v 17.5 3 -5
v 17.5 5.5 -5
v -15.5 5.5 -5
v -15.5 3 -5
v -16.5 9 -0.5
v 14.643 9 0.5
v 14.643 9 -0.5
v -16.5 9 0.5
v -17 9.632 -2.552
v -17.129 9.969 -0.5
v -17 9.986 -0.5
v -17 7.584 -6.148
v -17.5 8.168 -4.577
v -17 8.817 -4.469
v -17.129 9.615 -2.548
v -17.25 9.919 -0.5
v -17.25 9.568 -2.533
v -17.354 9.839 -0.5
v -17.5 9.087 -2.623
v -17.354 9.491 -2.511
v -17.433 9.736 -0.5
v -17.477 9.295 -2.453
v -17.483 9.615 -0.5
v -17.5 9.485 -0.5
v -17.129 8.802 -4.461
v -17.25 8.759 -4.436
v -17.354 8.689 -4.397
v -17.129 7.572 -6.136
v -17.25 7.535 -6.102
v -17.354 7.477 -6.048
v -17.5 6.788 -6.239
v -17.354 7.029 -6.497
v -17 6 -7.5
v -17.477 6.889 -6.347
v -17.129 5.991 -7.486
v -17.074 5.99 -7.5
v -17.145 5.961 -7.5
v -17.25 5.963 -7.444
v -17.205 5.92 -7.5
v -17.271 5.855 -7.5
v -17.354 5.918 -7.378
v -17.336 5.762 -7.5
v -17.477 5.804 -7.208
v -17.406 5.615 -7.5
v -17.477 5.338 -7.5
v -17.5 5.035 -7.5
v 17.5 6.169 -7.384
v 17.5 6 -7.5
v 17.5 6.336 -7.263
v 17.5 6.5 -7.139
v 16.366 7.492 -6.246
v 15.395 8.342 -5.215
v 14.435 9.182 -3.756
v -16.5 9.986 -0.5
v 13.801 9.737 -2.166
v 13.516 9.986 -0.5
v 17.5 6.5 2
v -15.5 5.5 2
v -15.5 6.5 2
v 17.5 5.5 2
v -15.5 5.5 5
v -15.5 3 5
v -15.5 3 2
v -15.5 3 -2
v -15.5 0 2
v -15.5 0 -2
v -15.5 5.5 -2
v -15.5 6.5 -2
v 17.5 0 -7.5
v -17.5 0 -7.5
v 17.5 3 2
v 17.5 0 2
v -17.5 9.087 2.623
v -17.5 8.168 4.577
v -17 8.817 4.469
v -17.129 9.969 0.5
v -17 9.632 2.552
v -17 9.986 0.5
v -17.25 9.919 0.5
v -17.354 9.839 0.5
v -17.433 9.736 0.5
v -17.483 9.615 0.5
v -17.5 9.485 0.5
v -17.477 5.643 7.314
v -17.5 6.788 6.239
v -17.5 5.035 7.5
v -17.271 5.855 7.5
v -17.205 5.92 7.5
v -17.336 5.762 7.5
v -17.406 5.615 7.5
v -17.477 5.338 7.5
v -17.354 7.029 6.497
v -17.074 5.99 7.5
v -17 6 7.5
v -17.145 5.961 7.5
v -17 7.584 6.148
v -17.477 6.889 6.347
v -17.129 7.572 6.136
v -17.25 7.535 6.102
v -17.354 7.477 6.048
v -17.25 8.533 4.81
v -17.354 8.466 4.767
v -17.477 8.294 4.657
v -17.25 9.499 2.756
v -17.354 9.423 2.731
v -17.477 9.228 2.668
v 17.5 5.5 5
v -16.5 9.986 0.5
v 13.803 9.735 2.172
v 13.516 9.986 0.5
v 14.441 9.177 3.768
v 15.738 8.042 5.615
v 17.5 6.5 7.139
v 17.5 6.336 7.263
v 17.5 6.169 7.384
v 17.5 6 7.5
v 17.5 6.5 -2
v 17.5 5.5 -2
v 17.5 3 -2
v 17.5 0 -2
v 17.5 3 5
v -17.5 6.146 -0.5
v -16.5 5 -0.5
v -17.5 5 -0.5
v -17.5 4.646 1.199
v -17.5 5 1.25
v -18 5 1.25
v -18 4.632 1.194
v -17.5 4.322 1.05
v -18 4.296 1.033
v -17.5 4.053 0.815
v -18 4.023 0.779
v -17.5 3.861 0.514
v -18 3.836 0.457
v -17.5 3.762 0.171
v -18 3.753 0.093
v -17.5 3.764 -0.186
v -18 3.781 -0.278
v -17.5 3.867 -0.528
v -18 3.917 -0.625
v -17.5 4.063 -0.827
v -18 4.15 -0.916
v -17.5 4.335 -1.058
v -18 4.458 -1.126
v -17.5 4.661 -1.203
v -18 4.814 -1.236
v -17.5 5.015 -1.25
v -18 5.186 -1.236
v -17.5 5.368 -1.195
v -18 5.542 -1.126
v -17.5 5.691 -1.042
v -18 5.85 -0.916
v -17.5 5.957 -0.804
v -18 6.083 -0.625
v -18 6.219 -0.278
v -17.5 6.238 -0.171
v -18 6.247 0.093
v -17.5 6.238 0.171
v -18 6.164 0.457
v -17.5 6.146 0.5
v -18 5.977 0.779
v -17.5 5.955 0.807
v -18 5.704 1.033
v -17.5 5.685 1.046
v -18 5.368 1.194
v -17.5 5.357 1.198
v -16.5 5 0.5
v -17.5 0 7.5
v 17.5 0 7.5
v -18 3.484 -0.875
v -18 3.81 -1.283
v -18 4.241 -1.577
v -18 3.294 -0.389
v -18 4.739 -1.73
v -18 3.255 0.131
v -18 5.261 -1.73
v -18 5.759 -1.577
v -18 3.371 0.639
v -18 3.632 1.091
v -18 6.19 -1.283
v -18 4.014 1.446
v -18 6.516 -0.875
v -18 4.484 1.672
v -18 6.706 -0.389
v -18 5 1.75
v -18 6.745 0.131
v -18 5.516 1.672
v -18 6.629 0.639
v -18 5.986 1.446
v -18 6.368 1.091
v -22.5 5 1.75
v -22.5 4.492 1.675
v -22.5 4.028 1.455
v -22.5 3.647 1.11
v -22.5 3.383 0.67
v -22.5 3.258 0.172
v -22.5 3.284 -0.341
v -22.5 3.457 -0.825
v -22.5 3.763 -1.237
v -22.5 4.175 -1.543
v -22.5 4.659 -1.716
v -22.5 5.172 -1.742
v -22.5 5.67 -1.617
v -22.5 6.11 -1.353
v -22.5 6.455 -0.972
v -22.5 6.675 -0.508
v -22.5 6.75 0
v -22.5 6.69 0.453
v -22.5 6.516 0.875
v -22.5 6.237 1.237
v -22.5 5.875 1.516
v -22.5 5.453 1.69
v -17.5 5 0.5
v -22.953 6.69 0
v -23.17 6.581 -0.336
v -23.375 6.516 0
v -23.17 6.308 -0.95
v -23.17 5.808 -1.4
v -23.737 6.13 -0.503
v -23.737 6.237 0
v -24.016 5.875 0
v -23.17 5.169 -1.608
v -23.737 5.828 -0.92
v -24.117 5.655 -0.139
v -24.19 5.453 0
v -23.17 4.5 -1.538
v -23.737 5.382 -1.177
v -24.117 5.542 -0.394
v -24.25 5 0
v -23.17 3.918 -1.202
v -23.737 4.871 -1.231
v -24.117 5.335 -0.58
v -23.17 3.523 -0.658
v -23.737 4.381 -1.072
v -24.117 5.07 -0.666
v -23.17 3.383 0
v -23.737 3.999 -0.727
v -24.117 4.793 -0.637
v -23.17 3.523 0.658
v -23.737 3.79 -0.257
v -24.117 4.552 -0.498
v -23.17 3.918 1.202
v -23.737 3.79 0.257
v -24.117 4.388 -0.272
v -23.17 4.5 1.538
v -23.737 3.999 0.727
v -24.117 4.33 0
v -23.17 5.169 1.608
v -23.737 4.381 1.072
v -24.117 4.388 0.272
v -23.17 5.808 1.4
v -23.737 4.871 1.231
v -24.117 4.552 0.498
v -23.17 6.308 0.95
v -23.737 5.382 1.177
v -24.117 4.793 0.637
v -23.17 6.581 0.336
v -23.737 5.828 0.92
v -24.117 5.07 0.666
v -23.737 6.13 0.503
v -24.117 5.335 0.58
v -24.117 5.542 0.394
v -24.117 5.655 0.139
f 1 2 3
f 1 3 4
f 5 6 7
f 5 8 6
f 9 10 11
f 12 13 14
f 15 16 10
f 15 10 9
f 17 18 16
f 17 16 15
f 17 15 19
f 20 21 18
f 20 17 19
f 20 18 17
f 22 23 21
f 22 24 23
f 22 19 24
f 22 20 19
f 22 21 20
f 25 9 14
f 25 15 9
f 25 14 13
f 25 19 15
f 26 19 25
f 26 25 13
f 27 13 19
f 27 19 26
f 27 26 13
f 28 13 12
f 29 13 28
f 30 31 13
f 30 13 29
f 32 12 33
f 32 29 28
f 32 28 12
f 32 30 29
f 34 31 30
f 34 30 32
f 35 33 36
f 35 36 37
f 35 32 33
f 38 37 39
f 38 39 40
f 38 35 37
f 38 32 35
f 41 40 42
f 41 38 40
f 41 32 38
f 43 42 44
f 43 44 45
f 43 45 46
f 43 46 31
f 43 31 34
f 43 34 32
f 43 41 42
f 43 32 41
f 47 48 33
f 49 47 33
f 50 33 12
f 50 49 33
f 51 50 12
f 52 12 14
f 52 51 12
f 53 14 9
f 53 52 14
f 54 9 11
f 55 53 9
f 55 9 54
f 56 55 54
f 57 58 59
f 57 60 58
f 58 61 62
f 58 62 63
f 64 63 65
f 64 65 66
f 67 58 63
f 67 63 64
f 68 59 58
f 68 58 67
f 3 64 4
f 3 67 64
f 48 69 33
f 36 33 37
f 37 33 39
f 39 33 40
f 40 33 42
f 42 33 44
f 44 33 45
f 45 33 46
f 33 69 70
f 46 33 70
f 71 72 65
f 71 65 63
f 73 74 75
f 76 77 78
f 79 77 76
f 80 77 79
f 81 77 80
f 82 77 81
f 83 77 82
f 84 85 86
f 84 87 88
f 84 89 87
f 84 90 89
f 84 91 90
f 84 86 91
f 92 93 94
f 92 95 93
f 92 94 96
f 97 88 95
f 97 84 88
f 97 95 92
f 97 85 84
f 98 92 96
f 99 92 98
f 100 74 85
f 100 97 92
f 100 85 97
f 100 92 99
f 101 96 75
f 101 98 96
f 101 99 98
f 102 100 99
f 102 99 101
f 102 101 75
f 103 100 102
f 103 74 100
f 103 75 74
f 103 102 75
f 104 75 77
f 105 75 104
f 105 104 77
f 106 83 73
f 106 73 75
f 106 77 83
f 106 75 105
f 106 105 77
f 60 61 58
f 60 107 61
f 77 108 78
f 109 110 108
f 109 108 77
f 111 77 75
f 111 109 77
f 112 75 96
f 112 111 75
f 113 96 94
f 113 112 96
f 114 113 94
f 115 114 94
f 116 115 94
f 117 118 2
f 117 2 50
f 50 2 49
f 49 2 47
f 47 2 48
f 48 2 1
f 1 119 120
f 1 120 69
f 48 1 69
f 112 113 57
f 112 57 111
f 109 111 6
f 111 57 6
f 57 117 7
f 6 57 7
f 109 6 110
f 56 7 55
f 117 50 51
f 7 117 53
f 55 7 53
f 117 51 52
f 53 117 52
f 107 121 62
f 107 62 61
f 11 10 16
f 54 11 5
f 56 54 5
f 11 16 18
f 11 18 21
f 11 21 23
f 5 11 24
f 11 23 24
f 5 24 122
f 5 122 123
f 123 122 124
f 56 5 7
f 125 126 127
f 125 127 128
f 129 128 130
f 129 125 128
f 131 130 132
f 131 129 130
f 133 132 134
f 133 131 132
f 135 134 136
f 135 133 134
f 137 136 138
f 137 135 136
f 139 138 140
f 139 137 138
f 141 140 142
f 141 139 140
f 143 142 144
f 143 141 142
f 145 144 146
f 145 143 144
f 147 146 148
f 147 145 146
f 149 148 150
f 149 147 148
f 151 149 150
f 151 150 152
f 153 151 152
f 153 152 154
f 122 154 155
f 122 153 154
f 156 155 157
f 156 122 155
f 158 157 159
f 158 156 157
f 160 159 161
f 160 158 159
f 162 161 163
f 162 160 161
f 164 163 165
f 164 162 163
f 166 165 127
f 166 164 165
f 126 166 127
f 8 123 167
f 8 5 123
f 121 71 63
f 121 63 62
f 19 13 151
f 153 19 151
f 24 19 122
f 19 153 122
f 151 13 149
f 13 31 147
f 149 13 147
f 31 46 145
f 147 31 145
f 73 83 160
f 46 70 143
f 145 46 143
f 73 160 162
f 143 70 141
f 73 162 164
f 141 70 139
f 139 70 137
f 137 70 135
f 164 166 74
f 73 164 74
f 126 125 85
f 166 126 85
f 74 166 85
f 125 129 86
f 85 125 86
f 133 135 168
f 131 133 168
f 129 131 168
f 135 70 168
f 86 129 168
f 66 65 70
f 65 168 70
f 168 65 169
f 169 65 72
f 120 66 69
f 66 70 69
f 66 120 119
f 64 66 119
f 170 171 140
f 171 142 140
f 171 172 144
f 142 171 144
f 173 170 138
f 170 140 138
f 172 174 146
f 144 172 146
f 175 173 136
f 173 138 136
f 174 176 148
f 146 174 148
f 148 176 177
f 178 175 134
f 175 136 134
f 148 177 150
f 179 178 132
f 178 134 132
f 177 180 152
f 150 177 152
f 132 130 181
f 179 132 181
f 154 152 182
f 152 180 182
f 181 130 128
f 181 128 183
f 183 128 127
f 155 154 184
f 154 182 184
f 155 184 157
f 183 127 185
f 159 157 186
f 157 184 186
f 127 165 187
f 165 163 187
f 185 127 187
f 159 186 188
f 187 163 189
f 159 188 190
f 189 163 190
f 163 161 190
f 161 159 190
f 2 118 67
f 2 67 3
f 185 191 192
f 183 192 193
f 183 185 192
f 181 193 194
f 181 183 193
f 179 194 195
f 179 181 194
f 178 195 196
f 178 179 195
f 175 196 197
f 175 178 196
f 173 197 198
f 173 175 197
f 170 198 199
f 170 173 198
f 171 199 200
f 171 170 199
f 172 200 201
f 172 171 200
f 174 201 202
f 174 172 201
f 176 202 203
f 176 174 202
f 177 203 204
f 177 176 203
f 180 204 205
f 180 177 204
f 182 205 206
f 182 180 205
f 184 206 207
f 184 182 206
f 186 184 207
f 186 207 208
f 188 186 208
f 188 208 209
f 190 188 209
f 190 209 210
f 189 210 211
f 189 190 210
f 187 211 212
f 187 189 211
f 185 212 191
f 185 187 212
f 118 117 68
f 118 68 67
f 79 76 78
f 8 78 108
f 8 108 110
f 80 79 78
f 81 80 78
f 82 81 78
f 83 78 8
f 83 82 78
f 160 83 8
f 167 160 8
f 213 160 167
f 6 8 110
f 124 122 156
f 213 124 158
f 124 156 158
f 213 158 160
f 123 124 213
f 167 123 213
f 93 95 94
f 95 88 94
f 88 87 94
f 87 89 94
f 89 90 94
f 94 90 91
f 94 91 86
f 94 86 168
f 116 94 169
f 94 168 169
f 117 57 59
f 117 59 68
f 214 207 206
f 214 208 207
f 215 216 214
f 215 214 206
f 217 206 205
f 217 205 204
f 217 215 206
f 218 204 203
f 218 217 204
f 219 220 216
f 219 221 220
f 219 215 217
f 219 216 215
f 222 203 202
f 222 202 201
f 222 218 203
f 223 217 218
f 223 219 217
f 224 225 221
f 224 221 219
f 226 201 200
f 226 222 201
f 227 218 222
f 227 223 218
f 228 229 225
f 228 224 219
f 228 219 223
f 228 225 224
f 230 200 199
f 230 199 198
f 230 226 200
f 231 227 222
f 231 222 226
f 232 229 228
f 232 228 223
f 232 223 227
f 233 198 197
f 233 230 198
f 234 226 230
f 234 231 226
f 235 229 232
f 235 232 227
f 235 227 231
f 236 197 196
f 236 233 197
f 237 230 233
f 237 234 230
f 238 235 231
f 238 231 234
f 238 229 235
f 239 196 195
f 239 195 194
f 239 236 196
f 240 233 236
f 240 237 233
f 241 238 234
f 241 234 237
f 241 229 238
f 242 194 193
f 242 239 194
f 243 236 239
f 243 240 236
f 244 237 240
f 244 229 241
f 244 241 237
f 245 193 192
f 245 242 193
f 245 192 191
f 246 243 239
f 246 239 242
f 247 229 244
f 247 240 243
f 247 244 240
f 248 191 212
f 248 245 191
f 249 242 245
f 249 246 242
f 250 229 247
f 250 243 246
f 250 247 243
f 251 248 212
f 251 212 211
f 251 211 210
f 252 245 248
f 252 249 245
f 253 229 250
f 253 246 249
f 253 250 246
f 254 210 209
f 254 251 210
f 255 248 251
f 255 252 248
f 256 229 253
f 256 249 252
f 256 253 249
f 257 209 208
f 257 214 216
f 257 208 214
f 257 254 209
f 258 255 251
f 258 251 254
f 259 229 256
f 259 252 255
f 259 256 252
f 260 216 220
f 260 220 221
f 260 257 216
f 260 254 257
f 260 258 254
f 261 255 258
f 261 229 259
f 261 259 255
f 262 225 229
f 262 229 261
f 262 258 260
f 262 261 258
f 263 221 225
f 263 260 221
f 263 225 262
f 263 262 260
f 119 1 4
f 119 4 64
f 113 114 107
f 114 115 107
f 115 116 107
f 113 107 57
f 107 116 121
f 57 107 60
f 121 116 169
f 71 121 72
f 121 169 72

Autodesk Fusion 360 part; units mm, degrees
sketch "Sketch1" plane through (0, 0, 0) normal (0, 1, 0) x (1, 0, 0)
  line L0 (17.5, 7.5) -> (-17.5, 7.5)
  line L1 (-17.5, 7.5) -> (-17.5, -7.5)
  line L2 (-17.5, -7.5) -> (17.5, -7.5)
  line L3 (17.5, -7.5) -> (17.5, 7.5)
  line L4 (17.5, 7.5) -> (-17.5, -7.5) construction
  line L5 (-17.5, 7.5) -> (17.5, -7.5) construction
  dimension "d3" = 35
  dimension "d4" = 15
extrude "Extrude1" add sketch "Sketch1" along normal blind 10
sketch "Sketch2" plane through (17.5, 0, 0) normal (1, 0, 0) x (0, 0, -1)
  line L0 (-7.5, 0) -> (7.5, 0)
  line L1 (7.5, 0) -> (7.5, 10)
  line L2 (7.5, 10) -> (-7.5, 10)
  line L3 (-7.5, 10) -> (-7.5, 0)
  line L4 (-2, 0) -> (2, 0)
  line L5 (-2, 0) -> (-2, 3)
  line L6 (2, 0) -> (2, 3)
  line L7 (-2, 3) -> (-5, 3)
  line L8 (-5, 3) -> (-5, 5.5)
  line L9 (-5, 5.5) -> (-2, 5.5)
  line L10 (-2, 5.5) -> (-2, 6.5)
  line L11 (-2, 6.5) -> (2, 6.5)
  line L12 (2, 6.5) -> (2, 5.5)
  line L13 (2, 5.5) -> (5, 5.5)
  line L14 (5, 5.5) -> (5, 3)
  line L15 (5, 3) -> (2, 3)
  arc A0 (7.5, 6) -> (-7.5, 6) centre (0, 0.9687) ccw
  line L16 (-7.5, 6) -> (-7.5, 10)
  line L17 (7.5, 6) -> (7.5, 10)
  line L18 (7.5, 10) -> (-7.5, 10)
  dimension "d7" = 4
  dimension "d8" = 3
  dimension "d9" = 3
  dimension "d10" = 3
  dimension "d11" = 2.5
  dimension "d12" = 3
  dimension "d13" = 1
  dimension "d14" = 4
  dimension "d15" = 1
  dimension "d16" = 3
  dimension "d17" = 2.5
  dimension "d18" = 3
  dimension "d23" = 15
  dimension "d24" = 6
extrude "Extrude2" cut sketch "Sketch2" against normal blind 33 contours L0 L4 L5 L6 L7 L8 L9 L10 L11 L12 L13 L14 L15
extrude "Extrude3" cut sketch "Sketch2" against normal blind 35 contours L2 L3 A0 L16 L18 | L1 L2 A0 L17 L18
sketch "Sketch3" plane through (0, 0, 0) normal (0, 0, 1) x (1, 0, 0)
  line L0 (17.5, 6.5) -> (13.5, 10)
  line L1 (13.5, 10) -> (17.5, 10)
  line L2 (17.5, 10) -> (17.5, 6.5)
  point P0 (17.5, 0)
  dimension "d28" = 6.5
extrude "Extrude4" cut sketch "Sketch3" along normal blind 7.5 and the other way blind 7.5
fillet "Fillet1" radius 0.5 1 edges at (-17.5, 10, 0)
sketch "Sketch4" plane through (-17.5, 0, 0) normal (-1, 0, 0) x (0, 0, 1)
  arc A0 (7.5, 5.0347) -> (-7.5, 5.0347) centre (0, 0.9688) ccw
  line L0 (-7.5, 5.0347) -> (-7.5, 0)
  line L1 (-7.5, 0) -> (7.5, 0)
  line L2 (7.5, 0) -> (7.5, 5.0347)
  circle A1 centre (0, 5) radius 1.75
  circle A2 centre (0, 5) radius 1.25
  dimension "d36" = 3.5
  dimension "d38" = 2.5
extrude "Extrude5" add sketch "Sketch4" along normal blind 5 contours A1 | A2
extrude "Extrude6" cut sketch "Sketch4" along normal blind 0.5 contours A1
sketch "Sketch6" plane through (0, 0, 0) normal (0, 0, 1) x (1, 0, 0)
  line L0 (-22.5, 6.75) -> (-22.5, 5)
  line L1 (-22.5, 5) -> (-24.25, 5)
  arc A0 (-22.5, 6.75) -> (-24.25, 5) centre (-22.5, 5) ccw
  dimension "d46" = 1.75
revolve "Revolve1" add sketch "Sketch6" angle 360 about axis through (-22.5, 5, 0) along (-1, 0, 0)
sketch "Sketch7" plane through (-17.5, 0, 0) normal (-1, 0, 0) x (0, 0, 1)
  circle A0 centre (0, 5) radius 1.25
  arc A1 (7.5, 5.0347) -> (-7.5, 5.0347) centre (0, 0.9688) ccw
  line L0 (-7.5, 5.0347) -> (-7.5, 0)
  line L1 (-7.5, 0) -> (7.5, 0)
  line L2 (7.5, 0) -> (7.5, 5.0347)
  line L3 (-0.5, 10) -> (-0.5, 5)
  line L4 (-0.5, 10) -> (0.5, 10)
  line L5 (0.5, 10) -> (0.5, 5)
  line L6 (-0.5, 5) -> (0.5, 5)
  dimension "d48" = 1
  dimension "d49" = 5
extrude "Extrude7" cut sketch "Sketch7" against normal blind 1 contours A0 L3 L5 L6 | A0 A1 L3 L5 | A1 L3 L4 L5 picked at (0, 5.4167)
sketch "Sketch8" plane through (-16.5, 0, 0) normal (-1, 0, 0) x (0, 0, 1)
  arc A0 (0.5, 9.9861) -> (-0.5, 9.9861) centre (0, 0.9687) ccw
  line L0 (-0.5, 9.9861) -> (-0.5, 5)
  line L1 (-0.5, 5) -> (0.5, 5)
  line L2 (0.5, 5) -> (0.5, 9.9861)
  line L3 (-0.5, 10) -> (0.5, 10)
  line L4 (0.5, 10) -> (0.5, 9)
  line L5 (0.5, 9) -> (-0.5, 9)
  line L6 (-0.5, 9) -> (-0.5, 10)
extrude "Extrude8" cut sketch "Sketch8" against normal blind 35 contours A0 L0 L2 L4 L5 L6
